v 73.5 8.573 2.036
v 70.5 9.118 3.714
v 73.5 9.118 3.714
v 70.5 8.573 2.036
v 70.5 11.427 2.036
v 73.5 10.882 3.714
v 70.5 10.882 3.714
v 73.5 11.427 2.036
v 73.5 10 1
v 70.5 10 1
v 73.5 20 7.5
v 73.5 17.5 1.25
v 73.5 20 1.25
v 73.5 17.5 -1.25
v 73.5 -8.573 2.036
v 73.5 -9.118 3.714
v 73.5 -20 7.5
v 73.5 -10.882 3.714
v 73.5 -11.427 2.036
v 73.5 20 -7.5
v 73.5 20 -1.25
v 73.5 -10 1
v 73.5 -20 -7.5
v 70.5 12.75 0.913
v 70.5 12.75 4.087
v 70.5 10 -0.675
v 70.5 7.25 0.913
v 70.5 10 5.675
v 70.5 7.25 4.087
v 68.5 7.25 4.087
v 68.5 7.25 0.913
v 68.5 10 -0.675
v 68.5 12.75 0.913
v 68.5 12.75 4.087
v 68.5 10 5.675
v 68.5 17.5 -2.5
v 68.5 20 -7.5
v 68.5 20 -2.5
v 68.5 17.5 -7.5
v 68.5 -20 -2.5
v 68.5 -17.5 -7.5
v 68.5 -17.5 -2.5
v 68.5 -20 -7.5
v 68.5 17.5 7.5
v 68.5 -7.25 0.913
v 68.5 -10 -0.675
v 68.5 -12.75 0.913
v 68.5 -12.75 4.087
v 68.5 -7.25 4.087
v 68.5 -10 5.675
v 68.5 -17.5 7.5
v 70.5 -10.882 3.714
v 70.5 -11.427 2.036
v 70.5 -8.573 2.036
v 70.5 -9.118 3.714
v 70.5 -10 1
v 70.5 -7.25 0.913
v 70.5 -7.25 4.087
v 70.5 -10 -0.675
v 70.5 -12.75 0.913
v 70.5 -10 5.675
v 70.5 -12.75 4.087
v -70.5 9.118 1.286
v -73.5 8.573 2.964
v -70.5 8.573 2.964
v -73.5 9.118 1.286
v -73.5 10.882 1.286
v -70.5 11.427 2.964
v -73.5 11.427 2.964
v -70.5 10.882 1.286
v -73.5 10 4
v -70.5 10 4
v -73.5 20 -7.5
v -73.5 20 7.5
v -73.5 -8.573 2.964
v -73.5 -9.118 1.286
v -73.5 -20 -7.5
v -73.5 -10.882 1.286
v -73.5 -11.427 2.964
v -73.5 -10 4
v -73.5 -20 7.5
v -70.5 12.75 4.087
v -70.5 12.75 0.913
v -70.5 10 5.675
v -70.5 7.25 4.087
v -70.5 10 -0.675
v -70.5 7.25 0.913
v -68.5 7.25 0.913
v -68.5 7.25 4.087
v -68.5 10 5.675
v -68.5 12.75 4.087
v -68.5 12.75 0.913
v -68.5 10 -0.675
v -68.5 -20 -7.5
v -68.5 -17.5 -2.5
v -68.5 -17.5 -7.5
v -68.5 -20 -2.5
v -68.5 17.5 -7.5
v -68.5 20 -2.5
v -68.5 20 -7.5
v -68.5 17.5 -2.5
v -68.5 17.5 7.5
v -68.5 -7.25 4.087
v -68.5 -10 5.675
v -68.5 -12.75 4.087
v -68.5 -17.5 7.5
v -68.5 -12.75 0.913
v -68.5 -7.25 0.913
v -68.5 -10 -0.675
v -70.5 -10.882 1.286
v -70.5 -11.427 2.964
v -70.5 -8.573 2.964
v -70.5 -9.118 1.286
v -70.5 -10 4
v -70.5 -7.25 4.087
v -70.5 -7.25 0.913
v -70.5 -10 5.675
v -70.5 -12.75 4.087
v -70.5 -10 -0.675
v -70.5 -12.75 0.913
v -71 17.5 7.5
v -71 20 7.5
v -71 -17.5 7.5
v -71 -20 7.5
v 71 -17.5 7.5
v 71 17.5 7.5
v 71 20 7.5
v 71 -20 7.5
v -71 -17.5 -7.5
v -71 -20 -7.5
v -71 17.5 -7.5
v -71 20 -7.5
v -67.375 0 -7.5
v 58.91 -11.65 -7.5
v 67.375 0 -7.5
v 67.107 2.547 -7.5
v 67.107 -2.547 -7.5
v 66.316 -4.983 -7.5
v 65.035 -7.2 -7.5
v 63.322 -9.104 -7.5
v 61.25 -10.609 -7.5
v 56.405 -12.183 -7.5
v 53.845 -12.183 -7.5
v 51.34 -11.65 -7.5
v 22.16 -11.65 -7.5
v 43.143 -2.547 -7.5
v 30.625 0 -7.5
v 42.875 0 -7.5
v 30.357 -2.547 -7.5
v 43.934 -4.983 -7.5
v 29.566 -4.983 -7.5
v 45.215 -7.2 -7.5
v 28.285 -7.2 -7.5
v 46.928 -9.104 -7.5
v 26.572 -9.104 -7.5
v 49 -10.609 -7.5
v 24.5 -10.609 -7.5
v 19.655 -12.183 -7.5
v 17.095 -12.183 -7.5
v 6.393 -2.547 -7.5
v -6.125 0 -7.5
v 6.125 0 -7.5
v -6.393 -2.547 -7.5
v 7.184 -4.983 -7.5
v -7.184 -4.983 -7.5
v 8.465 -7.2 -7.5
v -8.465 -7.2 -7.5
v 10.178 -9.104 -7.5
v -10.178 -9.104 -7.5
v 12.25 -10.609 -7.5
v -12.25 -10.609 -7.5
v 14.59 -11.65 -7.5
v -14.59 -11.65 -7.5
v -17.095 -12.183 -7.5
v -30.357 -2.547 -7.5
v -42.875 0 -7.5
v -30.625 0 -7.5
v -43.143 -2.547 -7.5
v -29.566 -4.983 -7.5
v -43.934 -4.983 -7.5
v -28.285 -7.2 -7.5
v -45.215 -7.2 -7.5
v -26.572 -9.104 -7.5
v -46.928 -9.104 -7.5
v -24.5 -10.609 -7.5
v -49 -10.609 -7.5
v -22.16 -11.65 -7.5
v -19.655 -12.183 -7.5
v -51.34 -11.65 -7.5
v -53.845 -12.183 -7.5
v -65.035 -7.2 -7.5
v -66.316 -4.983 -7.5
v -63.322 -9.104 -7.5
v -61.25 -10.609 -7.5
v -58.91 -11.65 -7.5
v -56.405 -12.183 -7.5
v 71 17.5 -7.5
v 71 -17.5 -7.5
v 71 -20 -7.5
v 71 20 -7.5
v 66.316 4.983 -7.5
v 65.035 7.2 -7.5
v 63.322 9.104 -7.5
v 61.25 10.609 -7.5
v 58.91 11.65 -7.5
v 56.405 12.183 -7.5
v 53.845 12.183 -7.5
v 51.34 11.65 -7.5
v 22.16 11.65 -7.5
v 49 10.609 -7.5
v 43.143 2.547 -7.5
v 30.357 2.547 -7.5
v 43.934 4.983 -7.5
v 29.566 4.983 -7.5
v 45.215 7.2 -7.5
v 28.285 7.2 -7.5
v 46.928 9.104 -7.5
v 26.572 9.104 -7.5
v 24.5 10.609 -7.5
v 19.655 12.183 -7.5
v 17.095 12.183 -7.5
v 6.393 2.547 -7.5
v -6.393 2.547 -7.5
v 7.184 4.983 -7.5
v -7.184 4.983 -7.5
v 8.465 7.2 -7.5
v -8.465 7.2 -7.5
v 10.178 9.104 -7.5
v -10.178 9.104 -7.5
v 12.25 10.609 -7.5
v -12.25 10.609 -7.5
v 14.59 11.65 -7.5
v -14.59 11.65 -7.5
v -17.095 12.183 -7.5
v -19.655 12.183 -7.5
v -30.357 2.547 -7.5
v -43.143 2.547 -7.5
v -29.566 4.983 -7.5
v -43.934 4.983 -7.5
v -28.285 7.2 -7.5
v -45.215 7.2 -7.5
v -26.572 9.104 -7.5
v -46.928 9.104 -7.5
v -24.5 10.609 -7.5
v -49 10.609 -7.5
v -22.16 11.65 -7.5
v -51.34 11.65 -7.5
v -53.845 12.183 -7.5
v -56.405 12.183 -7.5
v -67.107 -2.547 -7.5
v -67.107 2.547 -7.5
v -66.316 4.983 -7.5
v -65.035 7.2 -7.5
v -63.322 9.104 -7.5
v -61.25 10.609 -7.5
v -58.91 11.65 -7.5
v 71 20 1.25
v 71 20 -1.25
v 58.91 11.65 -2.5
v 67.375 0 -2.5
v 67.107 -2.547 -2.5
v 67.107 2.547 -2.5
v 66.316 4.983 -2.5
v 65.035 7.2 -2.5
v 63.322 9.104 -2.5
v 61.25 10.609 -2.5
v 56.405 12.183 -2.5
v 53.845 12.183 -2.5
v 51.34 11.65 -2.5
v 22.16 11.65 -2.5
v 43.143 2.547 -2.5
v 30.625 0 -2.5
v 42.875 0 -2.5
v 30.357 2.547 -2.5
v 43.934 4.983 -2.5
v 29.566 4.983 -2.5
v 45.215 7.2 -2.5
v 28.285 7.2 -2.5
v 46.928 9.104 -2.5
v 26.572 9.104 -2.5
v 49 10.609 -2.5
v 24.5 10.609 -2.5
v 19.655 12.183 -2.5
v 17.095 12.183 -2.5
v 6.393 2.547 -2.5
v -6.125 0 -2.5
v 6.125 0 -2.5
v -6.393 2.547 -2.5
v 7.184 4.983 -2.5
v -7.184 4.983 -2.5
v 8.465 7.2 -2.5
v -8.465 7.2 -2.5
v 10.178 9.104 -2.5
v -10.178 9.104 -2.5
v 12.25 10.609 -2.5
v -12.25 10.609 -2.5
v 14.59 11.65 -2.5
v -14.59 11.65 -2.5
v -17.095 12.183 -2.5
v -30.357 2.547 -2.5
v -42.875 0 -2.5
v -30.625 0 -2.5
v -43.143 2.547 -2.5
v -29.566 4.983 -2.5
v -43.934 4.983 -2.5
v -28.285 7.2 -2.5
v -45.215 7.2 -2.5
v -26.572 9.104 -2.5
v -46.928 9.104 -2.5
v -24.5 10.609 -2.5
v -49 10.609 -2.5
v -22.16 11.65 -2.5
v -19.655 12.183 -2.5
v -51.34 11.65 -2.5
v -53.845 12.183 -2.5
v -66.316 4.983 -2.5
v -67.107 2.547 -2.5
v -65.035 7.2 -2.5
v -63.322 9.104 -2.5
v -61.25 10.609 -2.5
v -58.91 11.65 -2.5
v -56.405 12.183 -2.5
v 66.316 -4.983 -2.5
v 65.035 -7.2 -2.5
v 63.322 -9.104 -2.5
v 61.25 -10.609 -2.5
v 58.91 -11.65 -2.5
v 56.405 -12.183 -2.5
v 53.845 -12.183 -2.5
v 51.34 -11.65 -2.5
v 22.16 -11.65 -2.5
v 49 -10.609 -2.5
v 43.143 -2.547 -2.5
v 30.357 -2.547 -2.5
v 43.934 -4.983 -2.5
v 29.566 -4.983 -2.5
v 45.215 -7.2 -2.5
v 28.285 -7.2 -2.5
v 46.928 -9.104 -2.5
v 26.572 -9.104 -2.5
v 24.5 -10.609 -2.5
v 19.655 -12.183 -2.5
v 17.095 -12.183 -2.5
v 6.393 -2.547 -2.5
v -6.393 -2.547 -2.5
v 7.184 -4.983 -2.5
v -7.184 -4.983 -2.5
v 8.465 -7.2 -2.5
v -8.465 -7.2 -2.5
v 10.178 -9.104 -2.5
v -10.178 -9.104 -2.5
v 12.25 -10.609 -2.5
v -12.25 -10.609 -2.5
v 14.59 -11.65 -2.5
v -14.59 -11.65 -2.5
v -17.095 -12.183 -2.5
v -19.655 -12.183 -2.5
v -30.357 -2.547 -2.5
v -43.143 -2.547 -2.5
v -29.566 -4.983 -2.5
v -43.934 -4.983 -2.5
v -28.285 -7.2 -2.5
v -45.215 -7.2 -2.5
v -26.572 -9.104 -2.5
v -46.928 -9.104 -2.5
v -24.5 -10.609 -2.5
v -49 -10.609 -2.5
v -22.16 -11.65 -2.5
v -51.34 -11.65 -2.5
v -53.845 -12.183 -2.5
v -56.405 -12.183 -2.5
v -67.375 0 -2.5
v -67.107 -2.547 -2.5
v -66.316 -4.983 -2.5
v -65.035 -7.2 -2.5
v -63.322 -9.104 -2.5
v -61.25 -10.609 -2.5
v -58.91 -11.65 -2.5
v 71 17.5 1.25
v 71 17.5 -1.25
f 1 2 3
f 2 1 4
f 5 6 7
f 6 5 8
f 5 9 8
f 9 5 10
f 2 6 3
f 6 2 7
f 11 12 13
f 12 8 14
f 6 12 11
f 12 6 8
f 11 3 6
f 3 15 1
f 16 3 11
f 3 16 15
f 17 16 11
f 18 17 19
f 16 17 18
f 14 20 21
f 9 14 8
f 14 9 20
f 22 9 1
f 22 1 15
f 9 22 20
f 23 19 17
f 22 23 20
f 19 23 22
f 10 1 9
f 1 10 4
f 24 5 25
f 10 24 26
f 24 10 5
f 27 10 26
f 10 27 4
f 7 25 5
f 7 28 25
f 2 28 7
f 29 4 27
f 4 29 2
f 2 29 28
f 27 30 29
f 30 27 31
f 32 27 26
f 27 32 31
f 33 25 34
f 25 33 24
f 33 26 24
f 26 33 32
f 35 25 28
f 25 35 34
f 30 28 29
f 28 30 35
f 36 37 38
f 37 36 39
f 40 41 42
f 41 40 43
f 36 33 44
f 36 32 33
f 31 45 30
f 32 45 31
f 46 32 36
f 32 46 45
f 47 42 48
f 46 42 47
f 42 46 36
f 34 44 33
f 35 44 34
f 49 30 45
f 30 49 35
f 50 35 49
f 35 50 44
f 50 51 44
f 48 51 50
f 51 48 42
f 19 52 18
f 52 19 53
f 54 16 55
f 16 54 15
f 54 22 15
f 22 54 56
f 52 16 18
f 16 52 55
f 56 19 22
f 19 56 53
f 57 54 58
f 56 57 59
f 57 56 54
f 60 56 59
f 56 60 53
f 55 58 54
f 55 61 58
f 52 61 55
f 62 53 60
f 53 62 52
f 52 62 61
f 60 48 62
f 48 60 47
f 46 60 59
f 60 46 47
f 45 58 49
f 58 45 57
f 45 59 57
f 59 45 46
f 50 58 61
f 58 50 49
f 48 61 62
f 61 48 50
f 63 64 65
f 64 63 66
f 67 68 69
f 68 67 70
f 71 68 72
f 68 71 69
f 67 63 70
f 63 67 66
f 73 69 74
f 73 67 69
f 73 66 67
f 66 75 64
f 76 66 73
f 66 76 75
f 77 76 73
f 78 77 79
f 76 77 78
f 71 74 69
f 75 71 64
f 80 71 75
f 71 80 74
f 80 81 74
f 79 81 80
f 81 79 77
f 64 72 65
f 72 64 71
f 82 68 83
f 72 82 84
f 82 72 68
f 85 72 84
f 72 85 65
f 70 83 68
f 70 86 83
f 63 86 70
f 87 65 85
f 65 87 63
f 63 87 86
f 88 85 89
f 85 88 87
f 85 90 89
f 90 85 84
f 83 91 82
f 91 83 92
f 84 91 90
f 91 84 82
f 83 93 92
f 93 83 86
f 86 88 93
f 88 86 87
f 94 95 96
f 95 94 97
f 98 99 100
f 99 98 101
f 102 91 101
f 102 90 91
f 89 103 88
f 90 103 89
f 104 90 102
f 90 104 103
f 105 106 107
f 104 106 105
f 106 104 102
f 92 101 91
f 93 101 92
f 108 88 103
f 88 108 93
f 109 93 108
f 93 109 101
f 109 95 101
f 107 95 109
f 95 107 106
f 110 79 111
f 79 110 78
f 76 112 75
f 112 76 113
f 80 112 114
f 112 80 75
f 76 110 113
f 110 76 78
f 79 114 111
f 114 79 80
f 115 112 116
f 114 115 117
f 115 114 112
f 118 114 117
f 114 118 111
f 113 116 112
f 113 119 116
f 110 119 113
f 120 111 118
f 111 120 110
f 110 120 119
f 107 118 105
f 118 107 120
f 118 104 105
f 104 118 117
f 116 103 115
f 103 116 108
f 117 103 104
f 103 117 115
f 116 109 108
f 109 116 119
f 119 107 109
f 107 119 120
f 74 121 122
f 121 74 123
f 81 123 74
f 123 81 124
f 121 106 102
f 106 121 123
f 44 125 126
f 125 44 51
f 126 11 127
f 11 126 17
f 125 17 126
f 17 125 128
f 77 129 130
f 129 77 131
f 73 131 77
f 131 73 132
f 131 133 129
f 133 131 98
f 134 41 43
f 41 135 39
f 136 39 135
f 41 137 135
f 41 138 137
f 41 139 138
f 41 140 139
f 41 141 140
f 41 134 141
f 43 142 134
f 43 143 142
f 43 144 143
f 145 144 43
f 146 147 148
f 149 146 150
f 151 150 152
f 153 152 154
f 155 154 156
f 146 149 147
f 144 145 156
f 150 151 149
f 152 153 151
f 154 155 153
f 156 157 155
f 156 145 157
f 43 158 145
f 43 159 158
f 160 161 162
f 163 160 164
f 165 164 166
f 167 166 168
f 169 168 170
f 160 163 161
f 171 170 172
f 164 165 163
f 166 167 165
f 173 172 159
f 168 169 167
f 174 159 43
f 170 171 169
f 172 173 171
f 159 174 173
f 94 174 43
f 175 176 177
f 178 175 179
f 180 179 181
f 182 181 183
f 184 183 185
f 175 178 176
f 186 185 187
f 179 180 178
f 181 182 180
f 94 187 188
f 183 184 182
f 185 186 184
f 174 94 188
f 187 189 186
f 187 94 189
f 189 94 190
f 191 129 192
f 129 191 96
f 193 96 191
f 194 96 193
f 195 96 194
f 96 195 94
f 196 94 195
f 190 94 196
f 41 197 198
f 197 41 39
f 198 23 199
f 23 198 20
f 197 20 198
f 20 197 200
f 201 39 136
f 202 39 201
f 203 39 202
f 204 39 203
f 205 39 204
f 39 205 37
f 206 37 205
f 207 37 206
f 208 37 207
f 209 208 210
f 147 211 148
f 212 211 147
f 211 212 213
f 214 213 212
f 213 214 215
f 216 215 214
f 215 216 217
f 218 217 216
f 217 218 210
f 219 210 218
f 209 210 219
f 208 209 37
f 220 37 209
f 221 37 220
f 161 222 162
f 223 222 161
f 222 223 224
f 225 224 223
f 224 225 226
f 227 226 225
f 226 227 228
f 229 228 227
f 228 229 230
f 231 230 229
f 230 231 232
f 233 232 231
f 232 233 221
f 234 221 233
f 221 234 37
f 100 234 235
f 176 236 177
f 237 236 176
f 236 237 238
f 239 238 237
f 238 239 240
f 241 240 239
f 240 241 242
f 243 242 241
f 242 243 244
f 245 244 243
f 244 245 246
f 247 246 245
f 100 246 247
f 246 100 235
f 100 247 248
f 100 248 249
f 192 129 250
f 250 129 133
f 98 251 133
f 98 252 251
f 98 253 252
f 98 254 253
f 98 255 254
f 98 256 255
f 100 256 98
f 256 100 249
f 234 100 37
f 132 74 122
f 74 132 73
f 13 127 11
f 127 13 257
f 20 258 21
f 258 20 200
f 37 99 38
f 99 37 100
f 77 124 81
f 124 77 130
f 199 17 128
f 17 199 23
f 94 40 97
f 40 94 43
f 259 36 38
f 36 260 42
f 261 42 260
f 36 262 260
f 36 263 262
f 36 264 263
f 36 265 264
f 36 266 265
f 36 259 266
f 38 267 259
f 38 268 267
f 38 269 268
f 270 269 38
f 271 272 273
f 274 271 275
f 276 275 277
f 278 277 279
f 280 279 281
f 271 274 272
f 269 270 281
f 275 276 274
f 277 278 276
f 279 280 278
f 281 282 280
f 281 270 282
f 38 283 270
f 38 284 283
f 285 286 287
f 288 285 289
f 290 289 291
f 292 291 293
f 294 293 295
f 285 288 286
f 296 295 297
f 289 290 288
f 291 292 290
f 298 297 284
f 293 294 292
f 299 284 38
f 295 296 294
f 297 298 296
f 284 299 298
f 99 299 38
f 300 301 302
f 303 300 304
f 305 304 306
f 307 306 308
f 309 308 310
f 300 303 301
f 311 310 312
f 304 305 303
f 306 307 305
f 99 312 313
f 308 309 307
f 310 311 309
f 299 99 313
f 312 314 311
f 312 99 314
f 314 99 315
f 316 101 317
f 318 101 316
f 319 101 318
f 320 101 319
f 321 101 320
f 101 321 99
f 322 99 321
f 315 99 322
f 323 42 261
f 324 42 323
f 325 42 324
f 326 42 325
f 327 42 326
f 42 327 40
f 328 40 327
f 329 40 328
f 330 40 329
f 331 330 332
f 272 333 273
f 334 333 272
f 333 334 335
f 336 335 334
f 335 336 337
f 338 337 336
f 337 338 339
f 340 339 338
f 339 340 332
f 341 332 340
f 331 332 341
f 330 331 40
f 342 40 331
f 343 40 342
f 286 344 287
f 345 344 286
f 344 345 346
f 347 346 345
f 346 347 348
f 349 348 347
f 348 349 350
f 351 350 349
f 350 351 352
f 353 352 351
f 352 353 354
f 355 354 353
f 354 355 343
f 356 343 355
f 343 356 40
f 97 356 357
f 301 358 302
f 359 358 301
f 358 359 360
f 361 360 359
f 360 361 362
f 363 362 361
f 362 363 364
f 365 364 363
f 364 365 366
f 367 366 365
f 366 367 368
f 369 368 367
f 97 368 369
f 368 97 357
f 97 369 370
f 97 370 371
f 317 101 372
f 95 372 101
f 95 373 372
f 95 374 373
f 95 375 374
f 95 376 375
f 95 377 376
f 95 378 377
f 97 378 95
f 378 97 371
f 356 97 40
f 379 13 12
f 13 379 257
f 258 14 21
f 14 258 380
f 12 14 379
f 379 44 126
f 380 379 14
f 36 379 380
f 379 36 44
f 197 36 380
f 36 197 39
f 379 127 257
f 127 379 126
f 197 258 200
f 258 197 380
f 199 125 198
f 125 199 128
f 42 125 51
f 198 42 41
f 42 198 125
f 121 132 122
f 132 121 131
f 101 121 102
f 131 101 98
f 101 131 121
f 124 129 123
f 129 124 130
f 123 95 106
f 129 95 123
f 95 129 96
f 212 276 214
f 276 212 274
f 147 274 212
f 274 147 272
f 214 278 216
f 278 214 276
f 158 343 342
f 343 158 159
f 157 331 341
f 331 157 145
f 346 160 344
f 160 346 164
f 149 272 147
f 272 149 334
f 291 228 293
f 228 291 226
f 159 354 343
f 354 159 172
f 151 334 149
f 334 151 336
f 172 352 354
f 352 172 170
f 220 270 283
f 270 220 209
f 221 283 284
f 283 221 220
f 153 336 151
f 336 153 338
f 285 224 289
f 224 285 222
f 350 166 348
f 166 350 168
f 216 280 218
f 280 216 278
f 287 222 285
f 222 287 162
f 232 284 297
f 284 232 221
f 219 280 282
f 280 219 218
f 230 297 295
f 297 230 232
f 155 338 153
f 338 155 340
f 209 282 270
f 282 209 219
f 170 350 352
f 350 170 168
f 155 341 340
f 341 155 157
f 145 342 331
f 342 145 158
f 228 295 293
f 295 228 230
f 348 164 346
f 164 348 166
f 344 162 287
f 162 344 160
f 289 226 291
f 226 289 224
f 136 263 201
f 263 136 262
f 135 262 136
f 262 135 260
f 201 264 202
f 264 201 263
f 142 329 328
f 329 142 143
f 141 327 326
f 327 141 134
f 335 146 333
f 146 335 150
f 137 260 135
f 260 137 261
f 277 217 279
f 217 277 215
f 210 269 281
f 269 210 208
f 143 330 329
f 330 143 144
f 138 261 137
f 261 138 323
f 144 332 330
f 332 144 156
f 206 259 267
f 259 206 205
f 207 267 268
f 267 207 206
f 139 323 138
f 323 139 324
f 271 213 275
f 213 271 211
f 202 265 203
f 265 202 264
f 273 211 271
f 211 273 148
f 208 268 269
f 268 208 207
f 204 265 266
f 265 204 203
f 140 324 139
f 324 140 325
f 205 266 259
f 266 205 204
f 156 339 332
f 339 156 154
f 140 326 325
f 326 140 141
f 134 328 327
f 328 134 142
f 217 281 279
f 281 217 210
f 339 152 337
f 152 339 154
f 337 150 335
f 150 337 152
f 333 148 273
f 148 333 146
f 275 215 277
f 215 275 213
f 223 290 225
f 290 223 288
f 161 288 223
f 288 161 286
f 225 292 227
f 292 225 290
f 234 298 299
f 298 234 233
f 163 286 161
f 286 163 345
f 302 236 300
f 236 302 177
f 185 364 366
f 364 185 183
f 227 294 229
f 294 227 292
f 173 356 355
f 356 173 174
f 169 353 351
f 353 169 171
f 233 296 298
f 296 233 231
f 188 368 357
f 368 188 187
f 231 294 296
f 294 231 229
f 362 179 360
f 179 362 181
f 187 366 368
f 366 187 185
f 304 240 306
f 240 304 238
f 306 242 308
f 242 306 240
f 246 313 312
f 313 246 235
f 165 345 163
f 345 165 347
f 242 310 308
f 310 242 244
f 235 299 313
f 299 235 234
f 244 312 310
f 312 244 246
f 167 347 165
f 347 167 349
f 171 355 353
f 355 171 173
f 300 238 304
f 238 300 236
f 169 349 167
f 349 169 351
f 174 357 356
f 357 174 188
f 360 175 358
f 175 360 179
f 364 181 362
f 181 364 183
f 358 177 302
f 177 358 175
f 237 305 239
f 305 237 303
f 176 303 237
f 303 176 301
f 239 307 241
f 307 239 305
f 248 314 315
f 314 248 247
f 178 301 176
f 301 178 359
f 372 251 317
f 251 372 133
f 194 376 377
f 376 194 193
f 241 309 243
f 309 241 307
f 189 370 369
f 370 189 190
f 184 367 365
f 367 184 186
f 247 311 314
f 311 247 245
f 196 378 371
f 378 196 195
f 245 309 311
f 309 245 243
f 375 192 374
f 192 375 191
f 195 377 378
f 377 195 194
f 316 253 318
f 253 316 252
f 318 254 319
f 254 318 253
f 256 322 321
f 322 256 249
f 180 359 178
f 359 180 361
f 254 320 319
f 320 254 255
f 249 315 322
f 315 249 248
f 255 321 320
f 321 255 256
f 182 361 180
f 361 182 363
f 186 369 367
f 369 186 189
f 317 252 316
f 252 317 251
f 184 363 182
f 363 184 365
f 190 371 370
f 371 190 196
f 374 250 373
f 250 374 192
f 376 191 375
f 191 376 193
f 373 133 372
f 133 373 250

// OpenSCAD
difference($fn=100) {
  length = 147;
  length1 = length / 2;

  width = 40;
  width1 = width / 2;

  height = 15;
  height1 = height / 2;

  rimSize = 2.5;
  rimSize1 = rimSize / 2;
  rimSize2 = rimSize * 2;
  rimSize4 = rimSize * 4;

  cube([length, width, height], true);

  // The big gap in the middle
  translate([0, 0, rimSize])
    cube([length - rimSize4, width, height - rimSize2], true);

  rimWidth = 2.5;
  rimHalf = rimWidth / 2;

  // X axis rim
  xr = 0;
  yr = width1 - rimSize1;
  zr = height1 - (rimSize + rimSize1);

  translate([xr, yr, -zr])
    cube([length - rimSize4, rimSize, rimSize], true);
  translate([0, -yr, -zr])
    cube([length - rimSize4, rimSize, rimSize], true);

  // Z axis rim
  xr = length1 - (rimSize + rimSize1);
  yr = width1 - rimSize1;
  zr = 0;
  
  translate([xr, yr, zr])
    cube([rimWidth, rimWidth, height], true);
  translate([xr, -yr, zr])
    cube([rimWidth, rimWidth, height], true);
  translate([-xr, yr, zr])
    cube([rimWidth, rimWidth, height], true);
  translate([-xr, -yr, zr])
    cube([rimWidth, rimWidth, height], true);

  // Decorative holes
  cdiameter = 24.5;
  xc_offset = (length / 4);
  xc1 = xc_offset / 2;
  xc2 = xc1 + xc_offset;
    
  translate([xc1, 0, 0])
    cylinder(d = cdiameter, h = height, center = true);
  translate([xc2, 0, 0])
    cylinder(d = cdiameter, h = height, center = true);
  translate([-xc1, 0, 0])
    cylinder(d = cdiameter, h = height, center = true);
  translate([-xc2, 0, 0])
    cylinder(d = cdiameter, h = height, center = true);

  // Nut inserts
  nx = (length / 2) - rimSize;
  ny = width1 / 2;
  nz = rimSize;
  
  translate([nx, ny, nz])
    rotate([0, 90, 0])
      m3_nut_insert();

  translate([nx, -ny, nz])
    rotate([0, 90, 0])
      m3_nut_insert();

  translate([-nx, ny, nz])
    rotate([0, -90, 0])
      m3_nut_insert();

  translate([-nx, -ny, nz])
    rotate([0, -90, 0])
      m3_nut_insert();
}

module m3_nut_insert() {
  union() {
    translate([0, 0, 1])
      cylinder(d = 3, h = 3, center = true);
    translate([0, 0, -1.5])
      cylinder(r = 3.175, h = 2, center = true, $fn = 6);
  }
}
